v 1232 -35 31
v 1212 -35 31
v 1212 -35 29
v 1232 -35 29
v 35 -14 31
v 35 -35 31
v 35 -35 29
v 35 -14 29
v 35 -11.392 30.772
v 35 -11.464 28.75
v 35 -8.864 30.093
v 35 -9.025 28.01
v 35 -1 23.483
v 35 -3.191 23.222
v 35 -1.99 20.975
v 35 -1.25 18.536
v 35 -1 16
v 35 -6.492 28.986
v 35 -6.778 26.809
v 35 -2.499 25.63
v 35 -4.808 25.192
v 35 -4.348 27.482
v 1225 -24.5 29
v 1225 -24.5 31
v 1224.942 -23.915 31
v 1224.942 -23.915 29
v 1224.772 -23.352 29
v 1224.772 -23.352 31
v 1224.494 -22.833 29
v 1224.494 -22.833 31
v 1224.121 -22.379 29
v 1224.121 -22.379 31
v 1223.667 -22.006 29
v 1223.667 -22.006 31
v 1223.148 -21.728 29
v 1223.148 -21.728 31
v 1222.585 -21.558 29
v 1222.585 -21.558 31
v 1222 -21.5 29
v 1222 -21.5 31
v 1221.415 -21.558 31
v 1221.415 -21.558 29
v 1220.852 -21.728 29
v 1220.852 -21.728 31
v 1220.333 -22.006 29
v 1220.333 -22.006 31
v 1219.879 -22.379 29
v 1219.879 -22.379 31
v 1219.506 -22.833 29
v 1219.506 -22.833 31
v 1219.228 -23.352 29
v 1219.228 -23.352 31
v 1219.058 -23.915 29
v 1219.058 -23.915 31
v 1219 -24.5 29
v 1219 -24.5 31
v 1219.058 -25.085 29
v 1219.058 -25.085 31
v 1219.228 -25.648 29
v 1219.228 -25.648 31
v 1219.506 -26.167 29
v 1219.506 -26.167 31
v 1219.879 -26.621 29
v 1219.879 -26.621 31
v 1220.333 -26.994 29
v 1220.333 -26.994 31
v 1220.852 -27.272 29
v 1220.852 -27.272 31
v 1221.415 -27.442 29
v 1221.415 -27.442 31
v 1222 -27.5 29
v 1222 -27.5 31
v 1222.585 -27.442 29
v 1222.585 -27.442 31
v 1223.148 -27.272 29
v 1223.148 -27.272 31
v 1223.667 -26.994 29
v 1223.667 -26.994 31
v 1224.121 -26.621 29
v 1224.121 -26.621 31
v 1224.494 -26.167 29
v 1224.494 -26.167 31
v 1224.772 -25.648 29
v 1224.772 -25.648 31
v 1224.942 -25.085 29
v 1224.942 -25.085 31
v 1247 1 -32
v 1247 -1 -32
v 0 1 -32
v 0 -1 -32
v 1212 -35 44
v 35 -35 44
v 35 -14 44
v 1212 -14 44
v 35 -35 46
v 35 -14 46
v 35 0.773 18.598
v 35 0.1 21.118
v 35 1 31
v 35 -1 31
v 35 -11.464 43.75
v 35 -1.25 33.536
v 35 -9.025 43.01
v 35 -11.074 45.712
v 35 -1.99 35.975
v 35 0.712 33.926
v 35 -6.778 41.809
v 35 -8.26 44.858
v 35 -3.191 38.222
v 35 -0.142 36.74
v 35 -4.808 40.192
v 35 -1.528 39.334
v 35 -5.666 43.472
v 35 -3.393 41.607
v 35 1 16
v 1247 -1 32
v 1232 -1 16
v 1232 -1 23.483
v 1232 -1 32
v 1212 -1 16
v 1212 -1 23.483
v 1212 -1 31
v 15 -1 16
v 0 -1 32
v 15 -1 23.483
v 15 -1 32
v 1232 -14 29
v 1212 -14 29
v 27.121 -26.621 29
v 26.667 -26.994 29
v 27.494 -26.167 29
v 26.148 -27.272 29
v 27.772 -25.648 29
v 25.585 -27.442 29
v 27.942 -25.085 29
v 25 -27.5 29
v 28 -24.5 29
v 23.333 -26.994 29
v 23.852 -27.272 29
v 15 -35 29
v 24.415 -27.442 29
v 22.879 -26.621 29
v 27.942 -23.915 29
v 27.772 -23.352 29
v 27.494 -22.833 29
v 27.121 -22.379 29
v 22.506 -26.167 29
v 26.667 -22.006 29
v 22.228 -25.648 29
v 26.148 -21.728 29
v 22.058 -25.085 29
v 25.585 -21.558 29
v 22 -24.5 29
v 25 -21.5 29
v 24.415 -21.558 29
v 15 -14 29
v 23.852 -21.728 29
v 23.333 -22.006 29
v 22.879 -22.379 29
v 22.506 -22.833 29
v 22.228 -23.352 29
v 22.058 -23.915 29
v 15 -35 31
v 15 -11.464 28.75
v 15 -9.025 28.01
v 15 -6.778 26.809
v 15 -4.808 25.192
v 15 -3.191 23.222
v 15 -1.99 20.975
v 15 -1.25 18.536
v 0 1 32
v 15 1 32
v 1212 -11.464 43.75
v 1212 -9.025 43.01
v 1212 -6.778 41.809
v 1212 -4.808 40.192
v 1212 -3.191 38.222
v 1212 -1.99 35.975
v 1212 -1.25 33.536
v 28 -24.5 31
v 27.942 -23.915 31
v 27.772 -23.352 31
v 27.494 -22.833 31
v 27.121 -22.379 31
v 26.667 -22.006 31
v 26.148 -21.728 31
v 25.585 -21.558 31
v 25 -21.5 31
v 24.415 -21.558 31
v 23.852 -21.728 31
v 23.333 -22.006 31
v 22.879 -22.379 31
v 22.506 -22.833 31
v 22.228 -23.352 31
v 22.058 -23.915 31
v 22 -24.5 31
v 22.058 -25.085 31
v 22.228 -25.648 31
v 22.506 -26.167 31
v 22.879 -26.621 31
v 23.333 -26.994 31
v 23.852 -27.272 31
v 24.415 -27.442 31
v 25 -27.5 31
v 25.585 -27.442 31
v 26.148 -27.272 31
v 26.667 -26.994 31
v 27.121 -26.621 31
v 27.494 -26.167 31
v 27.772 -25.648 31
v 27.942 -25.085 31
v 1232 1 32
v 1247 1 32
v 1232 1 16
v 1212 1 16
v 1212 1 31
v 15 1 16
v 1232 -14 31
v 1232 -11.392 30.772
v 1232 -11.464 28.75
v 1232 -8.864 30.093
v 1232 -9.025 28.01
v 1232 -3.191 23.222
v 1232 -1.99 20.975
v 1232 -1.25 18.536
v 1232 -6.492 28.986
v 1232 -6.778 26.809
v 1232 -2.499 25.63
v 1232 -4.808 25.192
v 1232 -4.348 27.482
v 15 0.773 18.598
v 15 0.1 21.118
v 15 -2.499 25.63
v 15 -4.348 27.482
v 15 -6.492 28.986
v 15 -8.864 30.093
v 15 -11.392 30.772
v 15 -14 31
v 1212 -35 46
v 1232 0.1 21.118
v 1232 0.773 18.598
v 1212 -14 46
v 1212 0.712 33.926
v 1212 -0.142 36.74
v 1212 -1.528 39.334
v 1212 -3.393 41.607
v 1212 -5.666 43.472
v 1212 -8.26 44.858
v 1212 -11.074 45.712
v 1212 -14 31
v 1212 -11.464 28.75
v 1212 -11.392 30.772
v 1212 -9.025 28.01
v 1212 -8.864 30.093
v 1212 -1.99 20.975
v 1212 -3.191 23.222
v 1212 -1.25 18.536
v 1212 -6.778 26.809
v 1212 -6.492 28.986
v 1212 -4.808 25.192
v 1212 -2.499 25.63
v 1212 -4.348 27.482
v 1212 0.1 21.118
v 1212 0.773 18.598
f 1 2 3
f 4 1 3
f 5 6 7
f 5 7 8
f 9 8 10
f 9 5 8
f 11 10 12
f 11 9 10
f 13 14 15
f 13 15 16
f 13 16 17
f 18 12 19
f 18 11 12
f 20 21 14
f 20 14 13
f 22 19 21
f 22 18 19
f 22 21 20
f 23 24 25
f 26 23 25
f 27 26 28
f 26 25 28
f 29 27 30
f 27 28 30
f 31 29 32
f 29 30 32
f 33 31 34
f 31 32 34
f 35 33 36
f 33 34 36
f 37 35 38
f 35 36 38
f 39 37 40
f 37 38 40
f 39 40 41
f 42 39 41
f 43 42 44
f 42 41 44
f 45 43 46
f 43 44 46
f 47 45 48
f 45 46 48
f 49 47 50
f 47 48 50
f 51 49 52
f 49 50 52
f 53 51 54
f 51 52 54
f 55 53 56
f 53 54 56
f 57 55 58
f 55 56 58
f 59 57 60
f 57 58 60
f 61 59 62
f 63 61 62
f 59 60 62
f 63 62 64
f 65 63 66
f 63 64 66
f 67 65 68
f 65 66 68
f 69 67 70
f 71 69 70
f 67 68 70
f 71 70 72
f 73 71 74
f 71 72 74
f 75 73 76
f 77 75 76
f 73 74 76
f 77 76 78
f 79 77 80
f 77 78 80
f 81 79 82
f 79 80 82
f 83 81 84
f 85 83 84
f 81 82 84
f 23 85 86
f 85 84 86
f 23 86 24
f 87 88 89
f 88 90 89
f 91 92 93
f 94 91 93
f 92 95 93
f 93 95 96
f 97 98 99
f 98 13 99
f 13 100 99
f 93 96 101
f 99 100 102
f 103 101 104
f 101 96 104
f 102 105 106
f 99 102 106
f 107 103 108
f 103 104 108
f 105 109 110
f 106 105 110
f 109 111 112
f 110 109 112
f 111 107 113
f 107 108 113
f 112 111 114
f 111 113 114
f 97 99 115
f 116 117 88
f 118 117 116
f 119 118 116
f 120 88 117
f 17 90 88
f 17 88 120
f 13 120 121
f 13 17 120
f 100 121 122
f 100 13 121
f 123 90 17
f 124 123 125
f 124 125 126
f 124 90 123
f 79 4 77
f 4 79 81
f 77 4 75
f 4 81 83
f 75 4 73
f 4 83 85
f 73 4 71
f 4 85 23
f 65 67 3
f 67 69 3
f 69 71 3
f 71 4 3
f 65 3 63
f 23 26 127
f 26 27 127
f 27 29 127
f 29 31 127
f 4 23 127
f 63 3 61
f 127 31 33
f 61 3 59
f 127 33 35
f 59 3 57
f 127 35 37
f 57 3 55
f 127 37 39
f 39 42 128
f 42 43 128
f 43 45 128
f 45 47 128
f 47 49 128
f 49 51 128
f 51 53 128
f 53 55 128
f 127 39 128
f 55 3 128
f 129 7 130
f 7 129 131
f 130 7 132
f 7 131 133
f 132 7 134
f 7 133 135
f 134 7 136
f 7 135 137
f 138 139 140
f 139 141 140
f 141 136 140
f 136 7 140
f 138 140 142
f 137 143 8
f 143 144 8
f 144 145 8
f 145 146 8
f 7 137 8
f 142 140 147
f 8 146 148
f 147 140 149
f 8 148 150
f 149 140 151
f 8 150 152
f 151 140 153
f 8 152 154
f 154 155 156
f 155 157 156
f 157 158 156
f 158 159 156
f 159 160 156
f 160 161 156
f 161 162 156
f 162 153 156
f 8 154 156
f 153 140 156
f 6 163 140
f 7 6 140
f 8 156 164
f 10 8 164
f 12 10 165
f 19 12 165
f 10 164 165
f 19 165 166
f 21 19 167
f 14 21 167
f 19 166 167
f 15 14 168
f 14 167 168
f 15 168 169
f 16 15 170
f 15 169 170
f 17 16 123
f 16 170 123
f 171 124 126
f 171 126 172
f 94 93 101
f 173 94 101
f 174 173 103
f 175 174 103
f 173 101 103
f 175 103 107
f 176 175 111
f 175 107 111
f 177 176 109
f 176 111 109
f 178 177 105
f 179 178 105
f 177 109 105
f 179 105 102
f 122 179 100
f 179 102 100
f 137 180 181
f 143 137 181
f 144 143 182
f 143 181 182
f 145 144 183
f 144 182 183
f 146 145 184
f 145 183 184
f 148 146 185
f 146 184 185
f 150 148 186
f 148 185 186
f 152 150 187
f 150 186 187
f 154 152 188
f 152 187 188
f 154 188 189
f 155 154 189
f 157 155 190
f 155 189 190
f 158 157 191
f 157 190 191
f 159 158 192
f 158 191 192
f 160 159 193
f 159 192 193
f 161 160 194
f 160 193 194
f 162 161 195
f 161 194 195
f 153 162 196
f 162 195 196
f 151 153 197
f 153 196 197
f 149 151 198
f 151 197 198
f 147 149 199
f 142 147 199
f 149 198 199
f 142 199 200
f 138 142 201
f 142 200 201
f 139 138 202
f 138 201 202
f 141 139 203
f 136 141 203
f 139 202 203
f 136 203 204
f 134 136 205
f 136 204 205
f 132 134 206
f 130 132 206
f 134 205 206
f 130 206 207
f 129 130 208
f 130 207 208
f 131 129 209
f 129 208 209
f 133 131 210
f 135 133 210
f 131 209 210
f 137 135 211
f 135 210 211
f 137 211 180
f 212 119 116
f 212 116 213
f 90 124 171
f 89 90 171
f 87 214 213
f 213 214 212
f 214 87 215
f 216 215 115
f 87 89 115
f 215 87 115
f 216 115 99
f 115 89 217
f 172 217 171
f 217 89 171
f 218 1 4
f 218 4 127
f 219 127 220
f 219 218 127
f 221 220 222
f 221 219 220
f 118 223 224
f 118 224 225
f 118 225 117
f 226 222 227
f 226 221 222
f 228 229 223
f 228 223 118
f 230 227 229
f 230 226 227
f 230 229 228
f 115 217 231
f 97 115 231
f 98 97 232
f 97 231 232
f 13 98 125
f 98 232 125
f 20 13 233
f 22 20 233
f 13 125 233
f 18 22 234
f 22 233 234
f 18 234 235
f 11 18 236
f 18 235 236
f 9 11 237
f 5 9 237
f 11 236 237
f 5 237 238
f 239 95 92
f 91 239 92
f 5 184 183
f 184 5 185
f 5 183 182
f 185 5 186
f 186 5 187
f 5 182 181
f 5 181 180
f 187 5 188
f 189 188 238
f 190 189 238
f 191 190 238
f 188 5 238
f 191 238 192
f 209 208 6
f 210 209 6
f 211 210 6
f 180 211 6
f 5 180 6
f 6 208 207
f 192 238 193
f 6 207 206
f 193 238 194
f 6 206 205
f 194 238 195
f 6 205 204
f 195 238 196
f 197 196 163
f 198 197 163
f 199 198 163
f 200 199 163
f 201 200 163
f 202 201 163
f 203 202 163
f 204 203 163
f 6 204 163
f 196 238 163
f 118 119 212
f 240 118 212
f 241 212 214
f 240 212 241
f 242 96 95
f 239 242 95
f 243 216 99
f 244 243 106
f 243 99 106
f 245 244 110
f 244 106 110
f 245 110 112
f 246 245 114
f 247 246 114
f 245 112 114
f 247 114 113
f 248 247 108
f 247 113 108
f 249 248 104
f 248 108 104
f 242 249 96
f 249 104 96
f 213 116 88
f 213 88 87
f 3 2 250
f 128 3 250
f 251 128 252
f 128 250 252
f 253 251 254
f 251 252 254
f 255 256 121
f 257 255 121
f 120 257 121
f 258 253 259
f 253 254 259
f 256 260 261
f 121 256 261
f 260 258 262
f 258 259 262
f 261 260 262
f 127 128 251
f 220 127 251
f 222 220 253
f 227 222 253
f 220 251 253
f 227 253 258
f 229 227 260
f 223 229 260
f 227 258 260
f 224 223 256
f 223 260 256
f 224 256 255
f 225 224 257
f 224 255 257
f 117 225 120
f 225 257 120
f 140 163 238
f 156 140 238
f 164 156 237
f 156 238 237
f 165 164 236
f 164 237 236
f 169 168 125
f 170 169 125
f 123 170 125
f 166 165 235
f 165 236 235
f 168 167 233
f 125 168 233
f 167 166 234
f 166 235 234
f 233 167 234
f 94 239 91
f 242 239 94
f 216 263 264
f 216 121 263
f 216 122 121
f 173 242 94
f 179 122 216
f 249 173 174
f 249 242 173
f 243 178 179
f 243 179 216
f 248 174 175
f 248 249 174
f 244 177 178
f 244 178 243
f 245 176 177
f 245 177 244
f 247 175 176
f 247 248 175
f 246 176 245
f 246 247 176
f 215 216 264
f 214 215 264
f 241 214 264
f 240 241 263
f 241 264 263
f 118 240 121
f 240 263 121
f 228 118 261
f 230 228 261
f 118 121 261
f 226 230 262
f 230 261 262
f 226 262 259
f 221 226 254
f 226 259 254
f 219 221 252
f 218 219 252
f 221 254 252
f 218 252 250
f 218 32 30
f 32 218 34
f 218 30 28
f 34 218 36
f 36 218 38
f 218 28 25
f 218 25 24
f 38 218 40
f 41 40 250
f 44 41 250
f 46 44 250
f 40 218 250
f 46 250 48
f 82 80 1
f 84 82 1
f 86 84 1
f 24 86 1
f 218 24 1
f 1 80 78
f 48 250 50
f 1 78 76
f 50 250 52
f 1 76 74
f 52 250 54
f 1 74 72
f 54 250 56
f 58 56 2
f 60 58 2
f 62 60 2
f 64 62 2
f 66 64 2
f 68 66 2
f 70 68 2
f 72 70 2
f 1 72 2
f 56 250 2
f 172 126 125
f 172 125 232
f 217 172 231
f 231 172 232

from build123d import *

# Parameters (mm, degrees)
F0_W      = 2
F0_H      = 64
F1_DEPTH  = 15
F3_DEPTH  = 20
F5_DEPTH  = 1177
F7_DEPTH  = 20
F8_W      = 2
F8_H      = 64
F9_DEPTH  = 15
F10_R     = 3
F11_DEPTH = 2
F12_R     = 3
F13_DEPTH = 2


with BuildPart() as f1:
    # F0 (on Right) → F1 (new body)
    with BuildSketch(Plane.YZ):
        Rectangle(F0_W, F0_H)
    extrude(amount=F1_DEPTH)



with BuildPart() as f3:
    # F2 (on face) → F3 (new body)
    with BuildSketch(Plane.YZ.offset(1212)):
        with BuildLine():
            Line((-1, -32), (1, -32))
            Line((1, -32), (1, 16))
            ThreePointArc((1, 16), (-3.393398, 26.606602), (-14, 31))
            Line((-14, 31), (-35, 31))
            Line((-35, 31), (-35, 29))
            Line((-35, 29), (-14, 29))
            ThreePointArc((-14, 29), (-4.807612, 25.192388), (-1, 16))
            Line((-1, 16), (-1, -32))
        make_face()
    extrude(amount=F3_DEPTH)

    # F4 (on face) → F5 (join)
    with BuildSketch(Plane.YZ.offset(35)):
        with BuildLine():
            Line((-1, -32), (1, -32))
            Line((1, -32), (1, 31))
            ThreePointArc((1, 31), (-3.393398, 41.606602), (-14, 46))
            Line((-14, 46), (-35, 46))
            Line((-35, 46), (-35, 44))
            Line((-35, 44), (-14, 44))
            ThreePointArc((-14, 44), (-4.807612, 40.192388), (-1, 31))
            Line((-1, 31), (-1, -32))
        make_face()
    extrude(amount=F5_DEPTH)


with BuildPart() as f1_1:
    add(f1.part)

    add(f3.part)  # F7 merges F3
    # F6 (on face) → F7 (join)
    with BuildSketch(Plane.YZ.offset(15)):
        with BuildLine():
            Line((-1, -32), (1, -32))
            Line((1, -32), (1, 16))
            ThreePointArc((1, 16), (-3.393398, 26.606602), (-14, 31))
            Line((-14, 31), (-35, 31))
            Line((-35, 31), (-35, 29))
            Line((-35, 29), (-14, 29))
            ThreePointArc((-14, 29), (-4.807612, 25.192388), (-1, 16))
            Line((-1, 16), (-1, -32))
        make_face()
    extrude(amount=F7_DEPTH)

    # F8 (on face) → F9 (join)
    with BuildSketch(Plane.YZ.offset(1232)):
        Rectangle(F8_W, F8_H)
    extrude(amount=F9_DEPTH)

    # F10 (on face) → F11 (cut)
    with BuildSketch(Plane.XY.offset(31)):
        with Locations((1222, -24.5)):
            Circle(F10_R)
    extrude(amount=-F11_DEPTH, mode=Mode.SUBTRACT)

    # F12 (on face) → F13 (cut)
    with BuildSketch(Plane.XY.offset(31)):
        with Locations((25, -24.5)):
            Circle(F12_R)
    extrude(amount=-F13_DEPTH, mode=Mode.SUBTRACT)


solid = f1_1.part
